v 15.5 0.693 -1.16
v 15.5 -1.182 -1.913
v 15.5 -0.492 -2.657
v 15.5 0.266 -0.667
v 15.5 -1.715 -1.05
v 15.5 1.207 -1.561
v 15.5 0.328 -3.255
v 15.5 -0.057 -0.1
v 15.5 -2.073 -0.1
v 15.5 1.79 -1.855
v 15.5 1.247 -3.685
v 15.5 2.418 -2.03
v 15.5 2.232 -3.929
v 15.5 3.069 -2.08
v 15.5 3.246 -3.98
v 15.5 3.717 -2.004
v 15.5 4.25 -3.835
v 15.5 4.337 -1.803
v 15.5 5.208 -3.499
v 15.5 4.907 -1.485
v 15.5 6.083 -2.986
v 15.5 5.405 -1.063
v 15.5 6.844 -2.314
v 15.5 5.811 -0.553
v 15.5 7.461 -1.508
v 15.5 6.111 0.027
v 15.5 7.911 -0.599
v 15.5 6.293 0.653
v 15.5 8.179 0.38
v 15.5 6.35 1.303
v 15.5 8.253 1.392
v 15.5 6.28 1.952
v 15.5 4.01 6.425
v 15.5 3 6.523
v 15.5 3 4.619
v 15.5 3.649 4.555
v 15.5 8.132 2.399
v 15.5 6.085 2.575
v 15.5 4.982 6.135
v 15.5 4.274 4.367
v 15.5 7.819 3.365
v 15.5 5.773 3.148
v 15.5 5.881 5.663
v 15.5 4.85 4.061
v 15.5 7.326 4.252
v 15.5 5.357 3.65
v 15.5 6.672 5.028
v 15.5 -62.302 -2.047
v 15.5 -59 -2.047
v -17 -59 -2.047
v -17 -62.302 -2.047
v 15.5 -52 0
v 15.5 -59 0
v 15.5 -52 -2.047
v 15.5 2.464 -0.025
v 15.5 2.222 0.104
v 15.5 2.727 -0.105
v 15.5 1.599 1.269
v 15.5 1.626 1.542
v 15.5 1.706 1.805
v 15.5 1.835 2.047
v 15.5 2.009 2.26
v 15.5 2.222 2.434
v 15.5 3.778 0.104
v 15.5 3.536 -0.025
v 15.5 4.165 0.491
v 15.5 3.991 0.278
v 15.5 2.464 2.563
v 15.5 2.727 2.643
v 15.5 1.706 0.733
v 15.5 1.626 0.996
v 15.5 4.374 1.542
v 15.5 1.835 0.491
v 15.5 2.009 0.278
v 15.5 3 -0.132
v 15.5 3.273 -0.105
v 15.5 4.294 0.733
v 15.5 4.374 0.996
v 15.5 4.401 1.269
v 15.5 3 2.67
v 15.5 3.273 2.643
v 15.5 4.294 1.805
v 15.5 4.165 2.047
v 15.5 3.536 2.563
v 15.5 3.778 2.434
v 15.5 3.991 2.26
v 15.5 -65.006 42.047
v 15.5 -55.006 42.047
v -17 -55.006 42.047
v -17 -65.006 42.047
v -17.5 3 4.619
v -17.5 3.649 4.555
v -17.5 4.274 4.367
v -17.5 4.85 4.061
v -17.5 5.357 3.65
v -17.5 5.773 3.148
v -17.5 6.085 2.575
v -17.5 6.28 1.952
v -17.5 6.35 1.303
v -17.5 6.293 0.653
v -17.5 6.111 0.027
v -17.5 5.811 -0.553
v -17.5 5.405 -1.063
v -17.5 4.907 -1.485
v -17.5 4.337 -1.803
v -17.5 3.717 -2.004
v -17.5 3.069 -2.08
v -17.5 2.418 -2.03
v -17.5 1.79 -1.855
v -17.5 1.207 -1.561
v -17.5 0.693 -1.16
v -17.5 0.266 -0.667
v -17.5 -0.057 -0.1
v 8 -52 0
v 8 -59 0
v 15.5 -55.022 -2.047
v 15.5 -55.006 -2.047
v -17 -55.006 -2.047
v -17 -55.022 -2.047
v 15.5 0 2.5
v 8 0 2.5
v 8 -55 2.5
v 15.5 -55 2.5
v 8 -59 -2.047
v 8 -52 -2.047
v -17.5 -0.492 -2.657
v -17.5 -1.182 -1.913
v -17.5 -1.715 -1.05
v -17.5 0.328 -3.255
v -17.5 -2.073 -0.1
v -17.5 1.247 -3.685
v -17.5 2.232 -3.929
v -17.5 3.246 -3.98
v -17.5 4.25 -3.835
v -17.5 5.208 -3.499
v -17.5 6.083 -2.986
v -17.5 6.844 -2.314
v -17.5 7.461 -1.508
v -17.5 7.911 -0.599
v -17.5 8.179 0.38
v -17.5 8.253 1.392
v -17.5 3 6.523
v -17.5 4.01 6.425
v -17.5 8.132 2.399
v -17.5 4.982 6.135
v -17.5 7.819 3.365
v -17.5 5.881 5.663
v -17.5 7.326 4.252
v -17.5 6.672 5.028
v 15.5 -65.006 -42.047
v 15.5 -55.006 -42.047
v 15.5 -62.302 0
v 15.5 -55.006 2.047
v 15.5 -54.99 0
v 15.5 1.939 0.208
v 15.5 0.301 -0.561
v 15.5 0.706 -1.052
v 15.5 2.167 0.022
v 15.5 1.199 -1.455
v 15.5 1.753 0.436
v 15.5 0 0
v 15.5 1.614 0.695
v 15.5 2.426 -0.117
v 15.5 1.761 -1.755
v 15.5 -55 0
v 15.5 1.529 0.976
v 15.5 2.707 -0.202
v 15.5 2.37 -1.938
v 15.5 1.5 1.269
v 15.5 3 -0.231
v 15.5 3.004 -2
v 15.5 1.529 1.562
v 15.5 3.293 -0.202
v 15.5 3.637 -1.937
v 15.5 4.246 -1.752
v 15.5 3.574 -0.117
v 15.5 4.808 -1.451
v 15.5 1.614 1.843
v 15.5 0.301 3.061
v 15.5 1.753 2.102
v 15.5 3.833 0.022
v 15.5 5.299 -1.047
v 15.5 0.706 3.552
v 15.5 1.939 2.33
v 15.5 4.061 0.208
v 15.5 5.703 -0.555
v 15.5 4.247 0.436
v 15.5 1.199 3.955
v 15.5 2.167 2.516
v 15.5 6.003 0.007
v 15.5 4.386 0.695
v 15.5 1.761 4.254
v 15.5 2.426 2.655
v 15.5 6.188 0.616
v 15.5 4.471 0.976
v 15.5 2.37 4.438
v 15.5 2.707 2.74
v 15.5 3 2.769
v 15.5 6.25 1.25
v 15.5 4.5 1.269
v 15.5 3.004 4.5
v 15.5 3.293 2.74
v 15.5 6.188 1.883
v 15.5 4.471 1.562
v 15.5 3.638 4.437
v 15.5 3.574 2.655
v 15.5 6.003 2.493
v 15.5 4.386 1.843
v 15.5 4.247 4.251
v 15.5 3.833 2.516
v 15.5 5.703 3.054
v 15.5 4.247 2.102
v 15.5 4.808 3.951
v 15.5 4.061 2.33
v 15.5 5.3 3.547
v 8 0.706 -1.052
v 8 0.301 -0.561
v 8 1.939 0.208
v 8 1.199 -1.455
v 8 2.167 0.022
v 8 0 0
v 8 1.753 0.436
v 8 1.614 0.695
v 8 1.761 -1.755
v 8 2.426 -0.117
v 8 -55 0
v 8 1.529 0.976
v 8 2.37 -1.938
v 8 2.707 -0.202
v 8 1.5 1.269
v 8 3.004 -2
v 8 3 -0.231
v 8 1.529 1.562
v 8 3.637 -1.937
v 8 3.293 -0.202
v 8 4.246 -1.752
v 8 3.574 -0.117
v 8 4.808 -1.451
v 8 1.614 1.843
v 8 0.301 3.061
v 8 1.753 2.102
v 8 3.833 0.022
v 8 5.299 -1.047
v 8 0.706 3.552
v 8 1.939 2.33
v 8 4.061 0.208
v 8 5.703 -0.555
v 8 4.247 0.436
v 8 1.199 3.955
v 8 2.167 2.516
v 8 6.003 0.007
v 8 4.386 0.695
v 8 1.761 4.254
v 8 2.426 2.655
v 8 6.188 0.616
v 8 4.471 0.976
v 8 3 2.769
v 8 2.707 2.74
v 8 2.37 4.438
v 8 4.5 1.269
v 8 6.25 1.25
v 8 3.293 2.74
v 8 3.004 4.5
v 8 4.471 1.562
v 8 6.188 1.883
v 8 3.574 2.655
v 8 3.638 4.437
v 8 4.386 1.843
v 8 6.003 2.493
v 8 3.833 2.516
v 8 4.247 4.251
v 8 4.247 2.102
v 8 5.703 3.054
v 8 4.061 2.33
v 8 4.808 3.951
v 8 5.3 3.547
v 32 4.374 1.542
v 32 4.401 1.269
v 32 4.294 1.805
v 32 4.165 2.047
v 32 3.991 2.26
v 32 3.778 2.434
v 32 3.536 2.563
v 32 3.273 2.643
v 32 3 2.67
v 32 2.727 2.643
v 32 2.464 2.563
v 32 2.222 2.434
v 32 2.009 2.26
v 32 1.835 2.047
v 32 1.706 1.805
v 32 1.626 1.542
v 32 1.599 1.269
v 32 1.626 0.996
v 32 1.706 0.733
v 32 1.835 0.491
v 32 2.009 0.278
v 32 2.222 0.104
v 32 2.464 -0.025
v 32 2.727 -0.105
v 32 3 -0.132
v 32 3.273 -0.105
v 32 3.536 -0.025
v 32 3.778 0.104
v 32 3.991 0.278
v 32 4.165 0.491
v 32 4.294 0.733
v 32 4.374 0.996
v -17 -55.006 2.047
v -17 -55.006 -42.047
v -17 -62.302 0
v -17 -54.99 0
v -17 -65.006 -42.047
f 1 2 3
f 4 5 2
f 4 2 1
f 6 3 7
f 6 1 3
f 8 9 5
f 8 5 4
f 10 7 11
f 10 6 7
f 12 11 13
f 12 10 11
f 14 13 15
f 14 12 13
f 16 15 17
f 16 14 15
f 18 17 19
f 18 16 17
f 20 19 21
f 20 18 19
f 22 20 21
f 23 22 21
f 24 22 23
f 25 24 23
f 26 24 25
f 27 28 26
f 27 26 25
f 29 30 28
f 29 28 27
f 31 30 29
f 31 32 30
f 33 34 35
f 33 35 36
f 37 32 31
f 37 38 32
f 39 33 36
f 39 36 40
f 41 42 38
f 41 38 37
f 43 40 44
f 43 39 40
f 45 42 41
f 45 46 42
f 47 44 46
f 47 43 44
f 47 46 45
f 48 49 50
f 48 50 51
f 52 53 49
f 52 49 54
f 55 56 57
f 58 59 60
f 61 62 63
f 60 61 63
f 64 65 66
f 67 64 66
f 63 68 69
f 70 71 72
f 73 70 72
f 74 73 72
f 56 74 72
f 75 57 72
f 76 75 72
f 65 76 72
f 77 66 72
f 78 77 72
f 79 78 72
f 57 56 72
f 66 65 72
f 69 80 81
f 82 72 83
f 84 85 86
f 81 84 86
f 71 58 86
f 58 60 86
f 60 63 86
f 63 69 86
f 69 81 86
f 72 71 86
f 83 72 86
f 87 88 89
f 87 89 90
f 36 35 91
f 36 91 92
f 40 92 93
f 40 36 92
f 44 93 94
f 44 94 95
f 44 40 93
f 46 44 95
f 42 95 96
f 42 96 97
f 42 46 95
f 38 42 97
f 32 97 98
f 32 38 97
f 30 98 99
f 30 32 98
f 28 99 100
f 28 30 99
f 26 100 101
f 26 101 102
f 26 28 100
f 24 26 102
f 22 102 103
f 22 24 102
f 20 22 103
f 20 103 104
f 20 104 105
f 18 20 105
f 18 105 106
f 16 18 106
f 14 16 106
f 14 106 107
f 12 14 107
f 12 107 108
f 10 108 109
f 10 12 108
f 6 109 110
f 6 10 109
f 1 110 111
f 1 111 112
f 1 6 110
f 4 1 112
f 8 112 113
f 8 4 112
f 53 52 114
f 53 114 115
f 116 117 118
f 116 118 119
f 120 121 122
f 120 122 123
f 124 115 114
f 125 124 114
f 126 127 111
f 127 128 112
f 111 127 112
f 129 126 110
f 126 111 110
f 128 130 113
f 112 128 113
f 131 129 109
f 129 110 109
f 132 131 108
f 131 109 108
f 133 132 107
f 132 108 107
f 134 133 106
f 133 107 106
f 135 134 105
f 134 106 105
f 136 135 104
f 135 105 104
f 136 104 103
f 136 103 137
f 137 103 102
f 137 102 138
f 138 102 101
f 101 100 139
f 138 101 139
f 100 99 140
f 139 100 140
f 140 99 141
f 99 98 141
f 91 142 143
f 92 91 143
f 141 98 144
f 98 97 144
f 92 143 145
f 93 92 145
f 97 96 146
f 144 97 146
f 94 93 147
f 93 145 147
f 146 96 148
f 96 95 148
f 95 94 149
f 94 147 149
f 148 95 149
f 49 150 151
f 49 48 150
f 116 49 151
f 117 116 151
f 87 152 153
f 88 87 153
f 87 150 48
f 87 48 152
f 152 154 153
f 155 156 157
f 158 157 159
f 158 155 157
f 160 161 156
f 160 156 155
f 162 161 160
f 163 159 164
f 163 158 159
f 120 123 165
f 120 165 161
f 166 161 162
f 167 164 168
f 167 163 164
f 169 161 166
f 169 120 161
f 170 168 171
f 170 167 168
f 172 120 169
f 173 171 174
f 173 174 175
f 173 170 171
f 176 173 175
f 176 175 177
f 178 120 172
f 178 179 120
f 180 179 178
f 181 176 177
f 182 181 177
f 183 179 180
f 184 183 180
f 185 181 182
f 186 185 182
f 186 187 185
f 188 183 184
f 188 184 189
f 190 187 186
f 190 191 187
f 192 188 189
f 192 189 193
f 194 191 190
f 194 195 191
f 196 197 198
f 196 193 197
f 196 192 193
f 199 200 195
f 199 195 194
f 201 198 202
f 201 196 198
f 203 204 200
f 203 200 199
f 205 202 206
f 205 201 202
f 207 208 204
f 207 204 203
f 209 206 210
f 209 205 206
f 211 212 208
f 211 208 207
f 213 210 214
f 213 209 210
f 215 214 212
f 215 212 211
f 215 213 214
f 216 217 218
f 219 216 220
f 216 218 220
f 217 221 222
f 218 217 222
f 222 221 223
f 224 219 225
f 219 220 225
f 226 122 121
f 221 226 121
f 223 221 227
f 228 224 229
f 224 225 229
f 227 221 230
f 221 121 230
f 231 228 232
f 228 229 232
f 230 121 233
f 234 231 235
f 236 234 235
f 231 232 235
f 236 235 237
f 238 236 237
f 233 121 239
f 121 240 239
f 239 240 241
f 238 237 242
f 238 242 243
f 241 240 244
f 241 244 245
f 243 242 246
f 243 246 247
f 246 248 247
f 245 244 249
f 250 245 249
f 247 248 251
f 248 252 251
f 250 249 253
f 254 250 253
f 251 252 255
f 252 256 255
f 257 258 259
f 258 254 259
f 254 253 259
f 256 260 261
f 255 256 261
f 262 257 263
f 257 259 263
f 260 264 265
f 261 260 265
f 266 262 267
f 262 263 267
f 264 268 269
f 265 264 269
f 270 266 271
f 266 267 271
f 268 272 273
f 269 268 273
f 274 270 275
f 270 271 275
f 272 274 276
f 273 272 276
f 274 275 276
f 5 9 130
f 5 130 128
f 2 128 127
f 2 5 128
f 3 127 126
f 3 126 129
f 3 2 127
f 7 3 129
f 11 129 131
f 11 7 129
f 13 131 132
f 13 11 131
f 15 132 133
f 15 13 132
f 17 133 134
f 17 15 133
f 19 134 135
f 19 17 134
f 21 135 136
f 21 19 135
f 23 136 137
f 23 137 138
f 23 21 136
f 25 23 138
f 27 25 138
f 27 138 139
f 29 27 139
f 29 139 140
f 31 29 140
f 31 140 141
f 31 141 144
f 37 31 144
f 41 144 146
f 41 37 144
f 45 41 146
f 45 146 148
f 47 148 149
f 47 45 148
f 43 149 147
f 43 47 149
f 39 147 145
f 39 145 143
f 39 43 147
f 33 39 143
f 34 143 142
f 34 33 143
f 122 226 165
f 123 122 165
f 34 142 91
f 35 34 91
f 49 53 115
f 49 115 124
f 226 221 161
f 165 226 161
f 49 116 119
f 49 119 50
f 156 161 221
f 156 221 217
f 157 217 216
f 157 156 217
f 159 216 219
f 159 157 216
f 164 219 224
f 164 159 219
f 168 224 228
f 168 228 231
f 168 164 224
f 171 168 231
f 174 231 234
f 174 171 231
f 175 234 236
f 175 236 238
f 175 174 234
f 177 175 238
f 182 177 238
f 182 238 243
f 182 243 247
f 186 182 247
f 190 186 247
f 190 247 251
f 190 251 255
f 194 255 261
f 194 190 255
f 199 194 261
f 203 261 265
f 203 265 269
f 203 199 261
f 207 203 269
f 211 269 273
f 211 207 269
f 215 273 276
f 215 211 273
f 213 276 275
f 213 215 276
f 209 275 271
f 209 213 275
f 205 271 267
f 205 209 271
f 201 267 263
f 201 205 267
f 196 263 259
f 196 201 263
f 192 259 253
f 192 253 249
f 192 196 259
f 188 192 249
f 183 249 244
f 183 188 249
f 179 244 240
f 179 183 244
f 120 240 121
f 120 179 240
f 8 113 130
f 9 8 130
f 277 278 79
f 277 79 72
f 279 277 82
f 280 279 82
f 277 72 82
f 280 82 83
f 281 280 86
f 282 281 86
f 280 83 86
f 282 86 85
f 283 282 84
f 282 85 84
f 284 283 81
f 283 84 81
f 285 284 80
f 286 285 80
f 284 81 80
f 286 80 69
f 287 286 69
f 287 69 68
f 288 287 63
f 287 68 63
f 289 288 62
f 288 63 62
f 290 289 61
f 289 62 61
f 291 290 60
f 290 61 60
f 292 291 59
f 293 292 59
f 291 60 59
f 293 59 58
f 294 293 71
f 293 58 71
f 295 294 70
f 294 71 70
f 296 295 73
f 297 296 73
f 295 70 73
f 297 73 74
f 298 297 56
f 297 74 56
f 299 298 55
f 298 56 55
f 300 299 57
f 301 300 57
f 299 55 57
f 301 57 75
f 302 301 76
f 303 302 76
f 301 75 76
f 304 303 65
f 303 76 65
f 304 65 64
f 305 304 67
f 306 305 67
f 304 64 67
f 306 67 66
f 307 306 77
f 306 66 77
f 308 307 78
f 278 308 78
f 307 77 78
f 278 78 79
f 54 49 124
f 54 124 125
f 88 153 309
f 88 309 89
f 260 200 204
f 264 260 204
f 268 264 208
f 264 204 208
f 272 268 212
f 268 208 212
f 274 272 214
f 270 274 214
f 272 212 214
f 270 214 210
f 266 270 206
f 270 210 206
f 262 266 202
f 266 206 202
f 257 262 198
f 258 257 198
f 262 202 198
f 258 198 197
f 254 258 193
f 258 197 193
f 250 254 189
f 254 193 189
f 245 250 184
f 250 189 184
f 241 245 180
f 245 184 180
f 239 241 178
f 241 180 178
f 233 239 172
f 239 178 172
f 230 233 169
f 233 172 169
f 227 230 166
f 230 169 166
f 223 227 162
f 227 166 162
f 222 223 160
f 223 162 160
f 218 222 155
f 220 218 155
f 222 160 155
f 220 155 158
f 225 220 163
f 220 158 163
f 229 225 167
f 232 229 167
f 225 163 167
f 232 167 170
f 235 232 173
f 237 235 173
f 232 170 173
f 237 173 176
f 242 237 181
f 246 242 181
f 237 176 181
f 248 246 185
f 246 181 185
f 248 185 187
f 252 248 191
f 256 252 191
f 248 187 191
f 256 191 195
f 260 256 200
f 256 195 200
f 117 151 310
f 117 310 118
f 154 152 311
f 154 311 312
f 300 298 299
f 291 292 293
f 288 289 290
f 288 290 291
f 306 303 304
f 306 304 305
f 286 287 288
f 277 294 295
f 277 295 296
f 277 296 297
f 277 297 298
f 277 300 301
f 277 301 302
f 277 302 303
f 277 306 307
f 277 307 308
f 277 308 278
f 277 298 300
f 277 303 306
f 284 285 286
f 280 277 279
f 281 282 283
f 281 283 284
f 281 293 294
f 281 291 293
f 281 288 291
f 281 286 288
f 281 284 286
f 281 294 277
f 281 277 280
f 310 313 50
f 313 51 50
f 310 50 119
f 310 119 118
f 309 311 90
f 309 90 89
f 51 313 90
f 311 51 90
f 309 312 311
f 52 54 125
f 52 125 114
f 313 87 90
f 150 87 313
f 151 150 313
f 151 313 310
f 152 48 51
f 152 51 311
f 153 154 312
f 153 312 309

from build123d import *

# Parameters (mm, degrees)
F0_W      = 7.5
F0_H      = 55
F1_DEPTH  = 2.5
F2_R      = 1.5
F3_DEPTH  = 7.5
F5_DEPTH  = 33
F2_R_2    = 1.4010319541
F6_DEPTH  = 16.5
F9_DEPTH  = 7.5
F11_DEPTH = 32.5


# Not quite as in the source:
# - ends of sketch curves that miss each other by under 0.0002 mm in the source are joined
# - the program builds the solid bodies; features that only make, move or delete a surface that nothing else refers to are left out


with BuildPart() as f1:
    # F0 (on Top) → F1 (new body)
    with BuildSketch(Plane.XY):
        with Locations((11.75, -27.5)):
            Rectangle(F0_W, F0_H)
    extrude(amount=F1_DEPTH)

    # F2 (on face) → F3 (join)
    with BuildSketch(Plane.YZ.offset(15.5)):
        with BuildLine():
            ThreePointArc((0, 0), (6.2500474018, 1.249781204), (8.07847e-05, 2.4999663372))
            Line((8.07847e-05, 2.4999663372), (0, 2.4997724509))
            Line((0, 2.4997724509), (0, 0))
        make_face()
        with Locations((3.0000474035, 1.2689229439)):
            Circle(F2_R, mode=Mode.SUBTRACT)
    extrude(amount=-F3_DEPTH)


with BuildPart() as f5:
    # F2 (on face) → F5 (new body)
    with BuildSketch(Plane.YZ.offset(15.5)):
        with BuildLine():
            Line((-0.0574924529, -0.1), (-2.0730679938, -0.1))
            ThreePointArc((-2.0730679938, -0.1), (7.1715905231, -1.926179224), (3.0000474035, 6.5234876129))
            Line((3.0000474035, 6.5234876129), (3.0000474035, 4.6189229439))
            ThreePointArc((3.0000474035, 4.6189229439), (5.8114875916, -0.552698331), (-0.0574924529, -0.1))
        make_face()
    extrude(amount=-F5_DEPTH)


with BuildPart() as f6:
    # F2 (on face) → F6 (new body)
    with BuildSketch(Plane.YZ.offset(15.5)):
        with Locations((3.0000474035, 1.2689229439)):
            Circle(F2_R_2)
    extrude(amount=F6_DEPTH)


with BuildPart() as f9:
    # F8 (on face) → F9 (new body)
    with BuildSketch(Plane.YZ.offset(15.5)):
        Polygon((-52, -2.0469013694), (-52, 0), (-55, 0), (-59, 0), (-59, -2.0469013694), align=None)
    extrude(amount=-F9_DEPTH)


with BuildPart() as f11:
    # F10 (on face) → F11 (new body)
    with BuildSketch(Plane.YZ.offset(15.5)):
        Polygon((-59, 0), (-55.021867156, 0), (-54.99, 0), (-55.0059096515, 2.0469013694), (-55.0059096515, 42.0469013694), (-65.0059096515, 42.0469013694), (-65.0059096515, 2.0470365488), (-65.0059096515, 0), (-65.0059096515, -2.0470365488), (-65.0059096515, -42.0469013694), (-55.0059096515, -42.0469013694), (-55.0059096515, -2.0469013694), (-55.021867156, -2.0469013694), (-58.9999999993, -2.0469553613), (-62.3021833599, -2.047), (-62.3021833599, 0), align=None)
    extrude(amount=-F11_DEPTH)


solid = Compound([f1.part, f5.part, f6.part, f9.part, f11.part])
